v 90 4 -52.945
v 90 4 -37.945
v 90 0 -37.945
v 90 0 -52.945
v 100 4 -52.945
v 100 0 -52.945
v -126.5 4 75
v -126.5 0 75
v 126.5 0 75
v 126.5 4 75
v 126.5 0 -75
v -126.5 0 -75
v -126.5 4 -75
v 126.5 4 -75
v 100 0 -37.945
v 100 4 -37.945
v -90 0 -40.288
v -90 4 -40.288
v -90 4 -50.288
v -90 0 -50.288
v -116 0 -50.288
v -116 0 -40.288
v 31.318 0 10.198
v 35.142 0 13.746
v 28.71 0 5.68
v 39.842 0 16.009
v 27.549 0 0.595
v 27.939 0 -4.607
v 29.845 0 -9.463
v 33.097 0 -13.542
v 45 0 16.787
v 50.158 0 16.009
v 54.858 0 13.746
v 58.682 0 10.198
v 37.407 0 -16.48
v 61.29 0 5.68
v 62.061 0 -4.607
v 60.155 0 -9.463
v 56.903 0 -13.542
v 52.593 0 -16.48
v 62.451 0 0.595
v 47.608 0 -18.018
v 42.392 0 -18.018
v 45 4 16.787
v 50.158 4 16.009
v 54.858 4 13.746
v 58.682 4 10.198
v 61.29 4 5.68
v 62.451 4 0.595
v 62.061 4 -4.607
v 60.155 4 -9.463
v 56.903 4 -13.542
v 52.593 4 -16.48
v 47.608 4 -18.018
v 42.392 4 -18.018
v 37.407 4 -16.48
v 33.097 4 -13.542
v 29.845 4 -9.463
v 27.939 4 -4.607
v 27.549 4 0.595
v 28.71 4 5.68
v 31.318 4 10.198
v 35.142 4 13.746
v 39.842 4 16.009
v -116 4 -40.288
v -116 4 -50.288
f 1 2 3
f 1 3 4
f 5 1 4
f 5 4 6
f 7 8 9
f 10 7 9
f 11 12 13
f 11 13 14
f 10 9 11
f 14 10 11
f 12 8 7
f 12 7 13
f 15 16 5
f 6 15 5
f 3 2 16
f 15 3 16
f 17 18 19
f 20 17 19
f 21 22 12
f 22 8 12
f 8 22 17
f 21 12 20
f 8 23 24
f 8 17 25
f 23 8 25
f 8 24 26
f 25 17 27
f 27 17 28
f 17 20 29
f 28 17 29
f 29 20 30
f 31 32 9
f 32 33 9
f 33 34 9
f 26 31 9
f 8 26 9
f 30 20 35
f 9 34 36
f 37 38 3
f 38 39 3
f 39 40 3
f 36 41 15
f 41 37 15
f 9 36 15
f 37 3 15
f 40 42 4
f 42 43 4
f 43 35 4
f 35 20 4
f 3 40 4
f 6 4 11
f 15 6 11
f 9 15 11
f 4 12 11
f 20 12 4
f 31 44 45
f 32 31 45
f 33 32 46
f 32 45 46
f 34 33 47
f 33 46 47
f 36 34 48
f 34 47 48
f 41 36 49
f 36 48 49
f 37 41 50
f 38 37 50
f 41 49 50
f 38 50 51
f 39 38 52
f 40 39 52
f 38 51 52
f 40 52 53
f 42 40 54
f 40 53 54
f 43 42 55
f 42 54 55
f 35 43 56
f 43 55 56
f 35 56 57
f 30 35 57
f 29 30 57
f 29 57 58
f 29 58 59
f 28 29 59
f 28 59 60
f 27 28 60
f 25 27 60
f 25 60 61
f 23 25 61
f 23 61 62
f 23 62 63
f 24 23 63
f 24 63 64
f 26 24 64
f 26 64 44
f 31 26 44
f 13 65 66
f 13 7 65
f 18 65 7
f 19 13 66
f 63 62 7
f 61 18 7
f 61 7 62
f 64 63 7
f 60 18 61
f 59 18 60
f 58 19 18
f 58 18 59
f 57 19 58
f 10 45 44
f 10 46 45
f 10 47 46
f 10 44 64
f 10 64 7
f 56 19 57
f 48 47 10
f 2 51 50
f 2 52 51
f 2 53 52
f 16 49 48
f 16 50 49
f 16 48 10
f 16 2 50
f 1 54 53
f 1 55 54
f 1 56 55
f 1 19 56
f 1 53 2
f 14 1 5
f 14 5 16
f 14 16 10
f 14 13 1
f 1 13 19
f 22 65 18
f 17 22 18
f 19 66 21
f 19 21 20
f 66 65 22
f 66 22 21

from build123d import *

# Parameters (mm, degrees)
SKETCH2_W           = 253
SKETCH2_H           = 150
BOSS_EXTRUDE1_DEPTH = 4
SKETCH3_R           = 17.5
SKETCH3_W           = 26
SKETCH3_H           = 10
SKETCH3_W_2         = 10
SKETCH3_H_2         = 15
CUT_EXTRUDE1_DEPTH  = 148.116450474


with BuildPart() as part:
    # Sketch2 → Boss-Extrude1 (new body)
    with BuildSketch(Plane(origin=(0, 0, 0), x_dir=(1, 0, 0), z_dir=(0, 1, 0))):
        Rectangle(SKETCH2_W, SKETCH2_H)
    extrude(amount=BOSS_EXTRUDE1_DEPTH)

    # Sketch3 → Cut-Extrude1 (cut, through all)
    with BuildSketch(Plane(origin=(0, 4, 0), x_dir=(1, 0, 0), z_dir=(0, 1, 0))):
        with Locations(Location((45, 0.713202338, 0), (0, 0, 270))):
            Circle(SKETCH3_R)
        with Locations((-103, 45.288057663)):
            Rectangle(SKETCH3_W, SKETCH3_H)
        with Locations((95, 45.445405543)):
            Rectangle(SKETCH3_W_2, SKETCH3_H_2)
    extrude(amount=-CUT_EXTRUDE1_DEPTH, mode=Mode.SUBTRACT)


solid = part.part
